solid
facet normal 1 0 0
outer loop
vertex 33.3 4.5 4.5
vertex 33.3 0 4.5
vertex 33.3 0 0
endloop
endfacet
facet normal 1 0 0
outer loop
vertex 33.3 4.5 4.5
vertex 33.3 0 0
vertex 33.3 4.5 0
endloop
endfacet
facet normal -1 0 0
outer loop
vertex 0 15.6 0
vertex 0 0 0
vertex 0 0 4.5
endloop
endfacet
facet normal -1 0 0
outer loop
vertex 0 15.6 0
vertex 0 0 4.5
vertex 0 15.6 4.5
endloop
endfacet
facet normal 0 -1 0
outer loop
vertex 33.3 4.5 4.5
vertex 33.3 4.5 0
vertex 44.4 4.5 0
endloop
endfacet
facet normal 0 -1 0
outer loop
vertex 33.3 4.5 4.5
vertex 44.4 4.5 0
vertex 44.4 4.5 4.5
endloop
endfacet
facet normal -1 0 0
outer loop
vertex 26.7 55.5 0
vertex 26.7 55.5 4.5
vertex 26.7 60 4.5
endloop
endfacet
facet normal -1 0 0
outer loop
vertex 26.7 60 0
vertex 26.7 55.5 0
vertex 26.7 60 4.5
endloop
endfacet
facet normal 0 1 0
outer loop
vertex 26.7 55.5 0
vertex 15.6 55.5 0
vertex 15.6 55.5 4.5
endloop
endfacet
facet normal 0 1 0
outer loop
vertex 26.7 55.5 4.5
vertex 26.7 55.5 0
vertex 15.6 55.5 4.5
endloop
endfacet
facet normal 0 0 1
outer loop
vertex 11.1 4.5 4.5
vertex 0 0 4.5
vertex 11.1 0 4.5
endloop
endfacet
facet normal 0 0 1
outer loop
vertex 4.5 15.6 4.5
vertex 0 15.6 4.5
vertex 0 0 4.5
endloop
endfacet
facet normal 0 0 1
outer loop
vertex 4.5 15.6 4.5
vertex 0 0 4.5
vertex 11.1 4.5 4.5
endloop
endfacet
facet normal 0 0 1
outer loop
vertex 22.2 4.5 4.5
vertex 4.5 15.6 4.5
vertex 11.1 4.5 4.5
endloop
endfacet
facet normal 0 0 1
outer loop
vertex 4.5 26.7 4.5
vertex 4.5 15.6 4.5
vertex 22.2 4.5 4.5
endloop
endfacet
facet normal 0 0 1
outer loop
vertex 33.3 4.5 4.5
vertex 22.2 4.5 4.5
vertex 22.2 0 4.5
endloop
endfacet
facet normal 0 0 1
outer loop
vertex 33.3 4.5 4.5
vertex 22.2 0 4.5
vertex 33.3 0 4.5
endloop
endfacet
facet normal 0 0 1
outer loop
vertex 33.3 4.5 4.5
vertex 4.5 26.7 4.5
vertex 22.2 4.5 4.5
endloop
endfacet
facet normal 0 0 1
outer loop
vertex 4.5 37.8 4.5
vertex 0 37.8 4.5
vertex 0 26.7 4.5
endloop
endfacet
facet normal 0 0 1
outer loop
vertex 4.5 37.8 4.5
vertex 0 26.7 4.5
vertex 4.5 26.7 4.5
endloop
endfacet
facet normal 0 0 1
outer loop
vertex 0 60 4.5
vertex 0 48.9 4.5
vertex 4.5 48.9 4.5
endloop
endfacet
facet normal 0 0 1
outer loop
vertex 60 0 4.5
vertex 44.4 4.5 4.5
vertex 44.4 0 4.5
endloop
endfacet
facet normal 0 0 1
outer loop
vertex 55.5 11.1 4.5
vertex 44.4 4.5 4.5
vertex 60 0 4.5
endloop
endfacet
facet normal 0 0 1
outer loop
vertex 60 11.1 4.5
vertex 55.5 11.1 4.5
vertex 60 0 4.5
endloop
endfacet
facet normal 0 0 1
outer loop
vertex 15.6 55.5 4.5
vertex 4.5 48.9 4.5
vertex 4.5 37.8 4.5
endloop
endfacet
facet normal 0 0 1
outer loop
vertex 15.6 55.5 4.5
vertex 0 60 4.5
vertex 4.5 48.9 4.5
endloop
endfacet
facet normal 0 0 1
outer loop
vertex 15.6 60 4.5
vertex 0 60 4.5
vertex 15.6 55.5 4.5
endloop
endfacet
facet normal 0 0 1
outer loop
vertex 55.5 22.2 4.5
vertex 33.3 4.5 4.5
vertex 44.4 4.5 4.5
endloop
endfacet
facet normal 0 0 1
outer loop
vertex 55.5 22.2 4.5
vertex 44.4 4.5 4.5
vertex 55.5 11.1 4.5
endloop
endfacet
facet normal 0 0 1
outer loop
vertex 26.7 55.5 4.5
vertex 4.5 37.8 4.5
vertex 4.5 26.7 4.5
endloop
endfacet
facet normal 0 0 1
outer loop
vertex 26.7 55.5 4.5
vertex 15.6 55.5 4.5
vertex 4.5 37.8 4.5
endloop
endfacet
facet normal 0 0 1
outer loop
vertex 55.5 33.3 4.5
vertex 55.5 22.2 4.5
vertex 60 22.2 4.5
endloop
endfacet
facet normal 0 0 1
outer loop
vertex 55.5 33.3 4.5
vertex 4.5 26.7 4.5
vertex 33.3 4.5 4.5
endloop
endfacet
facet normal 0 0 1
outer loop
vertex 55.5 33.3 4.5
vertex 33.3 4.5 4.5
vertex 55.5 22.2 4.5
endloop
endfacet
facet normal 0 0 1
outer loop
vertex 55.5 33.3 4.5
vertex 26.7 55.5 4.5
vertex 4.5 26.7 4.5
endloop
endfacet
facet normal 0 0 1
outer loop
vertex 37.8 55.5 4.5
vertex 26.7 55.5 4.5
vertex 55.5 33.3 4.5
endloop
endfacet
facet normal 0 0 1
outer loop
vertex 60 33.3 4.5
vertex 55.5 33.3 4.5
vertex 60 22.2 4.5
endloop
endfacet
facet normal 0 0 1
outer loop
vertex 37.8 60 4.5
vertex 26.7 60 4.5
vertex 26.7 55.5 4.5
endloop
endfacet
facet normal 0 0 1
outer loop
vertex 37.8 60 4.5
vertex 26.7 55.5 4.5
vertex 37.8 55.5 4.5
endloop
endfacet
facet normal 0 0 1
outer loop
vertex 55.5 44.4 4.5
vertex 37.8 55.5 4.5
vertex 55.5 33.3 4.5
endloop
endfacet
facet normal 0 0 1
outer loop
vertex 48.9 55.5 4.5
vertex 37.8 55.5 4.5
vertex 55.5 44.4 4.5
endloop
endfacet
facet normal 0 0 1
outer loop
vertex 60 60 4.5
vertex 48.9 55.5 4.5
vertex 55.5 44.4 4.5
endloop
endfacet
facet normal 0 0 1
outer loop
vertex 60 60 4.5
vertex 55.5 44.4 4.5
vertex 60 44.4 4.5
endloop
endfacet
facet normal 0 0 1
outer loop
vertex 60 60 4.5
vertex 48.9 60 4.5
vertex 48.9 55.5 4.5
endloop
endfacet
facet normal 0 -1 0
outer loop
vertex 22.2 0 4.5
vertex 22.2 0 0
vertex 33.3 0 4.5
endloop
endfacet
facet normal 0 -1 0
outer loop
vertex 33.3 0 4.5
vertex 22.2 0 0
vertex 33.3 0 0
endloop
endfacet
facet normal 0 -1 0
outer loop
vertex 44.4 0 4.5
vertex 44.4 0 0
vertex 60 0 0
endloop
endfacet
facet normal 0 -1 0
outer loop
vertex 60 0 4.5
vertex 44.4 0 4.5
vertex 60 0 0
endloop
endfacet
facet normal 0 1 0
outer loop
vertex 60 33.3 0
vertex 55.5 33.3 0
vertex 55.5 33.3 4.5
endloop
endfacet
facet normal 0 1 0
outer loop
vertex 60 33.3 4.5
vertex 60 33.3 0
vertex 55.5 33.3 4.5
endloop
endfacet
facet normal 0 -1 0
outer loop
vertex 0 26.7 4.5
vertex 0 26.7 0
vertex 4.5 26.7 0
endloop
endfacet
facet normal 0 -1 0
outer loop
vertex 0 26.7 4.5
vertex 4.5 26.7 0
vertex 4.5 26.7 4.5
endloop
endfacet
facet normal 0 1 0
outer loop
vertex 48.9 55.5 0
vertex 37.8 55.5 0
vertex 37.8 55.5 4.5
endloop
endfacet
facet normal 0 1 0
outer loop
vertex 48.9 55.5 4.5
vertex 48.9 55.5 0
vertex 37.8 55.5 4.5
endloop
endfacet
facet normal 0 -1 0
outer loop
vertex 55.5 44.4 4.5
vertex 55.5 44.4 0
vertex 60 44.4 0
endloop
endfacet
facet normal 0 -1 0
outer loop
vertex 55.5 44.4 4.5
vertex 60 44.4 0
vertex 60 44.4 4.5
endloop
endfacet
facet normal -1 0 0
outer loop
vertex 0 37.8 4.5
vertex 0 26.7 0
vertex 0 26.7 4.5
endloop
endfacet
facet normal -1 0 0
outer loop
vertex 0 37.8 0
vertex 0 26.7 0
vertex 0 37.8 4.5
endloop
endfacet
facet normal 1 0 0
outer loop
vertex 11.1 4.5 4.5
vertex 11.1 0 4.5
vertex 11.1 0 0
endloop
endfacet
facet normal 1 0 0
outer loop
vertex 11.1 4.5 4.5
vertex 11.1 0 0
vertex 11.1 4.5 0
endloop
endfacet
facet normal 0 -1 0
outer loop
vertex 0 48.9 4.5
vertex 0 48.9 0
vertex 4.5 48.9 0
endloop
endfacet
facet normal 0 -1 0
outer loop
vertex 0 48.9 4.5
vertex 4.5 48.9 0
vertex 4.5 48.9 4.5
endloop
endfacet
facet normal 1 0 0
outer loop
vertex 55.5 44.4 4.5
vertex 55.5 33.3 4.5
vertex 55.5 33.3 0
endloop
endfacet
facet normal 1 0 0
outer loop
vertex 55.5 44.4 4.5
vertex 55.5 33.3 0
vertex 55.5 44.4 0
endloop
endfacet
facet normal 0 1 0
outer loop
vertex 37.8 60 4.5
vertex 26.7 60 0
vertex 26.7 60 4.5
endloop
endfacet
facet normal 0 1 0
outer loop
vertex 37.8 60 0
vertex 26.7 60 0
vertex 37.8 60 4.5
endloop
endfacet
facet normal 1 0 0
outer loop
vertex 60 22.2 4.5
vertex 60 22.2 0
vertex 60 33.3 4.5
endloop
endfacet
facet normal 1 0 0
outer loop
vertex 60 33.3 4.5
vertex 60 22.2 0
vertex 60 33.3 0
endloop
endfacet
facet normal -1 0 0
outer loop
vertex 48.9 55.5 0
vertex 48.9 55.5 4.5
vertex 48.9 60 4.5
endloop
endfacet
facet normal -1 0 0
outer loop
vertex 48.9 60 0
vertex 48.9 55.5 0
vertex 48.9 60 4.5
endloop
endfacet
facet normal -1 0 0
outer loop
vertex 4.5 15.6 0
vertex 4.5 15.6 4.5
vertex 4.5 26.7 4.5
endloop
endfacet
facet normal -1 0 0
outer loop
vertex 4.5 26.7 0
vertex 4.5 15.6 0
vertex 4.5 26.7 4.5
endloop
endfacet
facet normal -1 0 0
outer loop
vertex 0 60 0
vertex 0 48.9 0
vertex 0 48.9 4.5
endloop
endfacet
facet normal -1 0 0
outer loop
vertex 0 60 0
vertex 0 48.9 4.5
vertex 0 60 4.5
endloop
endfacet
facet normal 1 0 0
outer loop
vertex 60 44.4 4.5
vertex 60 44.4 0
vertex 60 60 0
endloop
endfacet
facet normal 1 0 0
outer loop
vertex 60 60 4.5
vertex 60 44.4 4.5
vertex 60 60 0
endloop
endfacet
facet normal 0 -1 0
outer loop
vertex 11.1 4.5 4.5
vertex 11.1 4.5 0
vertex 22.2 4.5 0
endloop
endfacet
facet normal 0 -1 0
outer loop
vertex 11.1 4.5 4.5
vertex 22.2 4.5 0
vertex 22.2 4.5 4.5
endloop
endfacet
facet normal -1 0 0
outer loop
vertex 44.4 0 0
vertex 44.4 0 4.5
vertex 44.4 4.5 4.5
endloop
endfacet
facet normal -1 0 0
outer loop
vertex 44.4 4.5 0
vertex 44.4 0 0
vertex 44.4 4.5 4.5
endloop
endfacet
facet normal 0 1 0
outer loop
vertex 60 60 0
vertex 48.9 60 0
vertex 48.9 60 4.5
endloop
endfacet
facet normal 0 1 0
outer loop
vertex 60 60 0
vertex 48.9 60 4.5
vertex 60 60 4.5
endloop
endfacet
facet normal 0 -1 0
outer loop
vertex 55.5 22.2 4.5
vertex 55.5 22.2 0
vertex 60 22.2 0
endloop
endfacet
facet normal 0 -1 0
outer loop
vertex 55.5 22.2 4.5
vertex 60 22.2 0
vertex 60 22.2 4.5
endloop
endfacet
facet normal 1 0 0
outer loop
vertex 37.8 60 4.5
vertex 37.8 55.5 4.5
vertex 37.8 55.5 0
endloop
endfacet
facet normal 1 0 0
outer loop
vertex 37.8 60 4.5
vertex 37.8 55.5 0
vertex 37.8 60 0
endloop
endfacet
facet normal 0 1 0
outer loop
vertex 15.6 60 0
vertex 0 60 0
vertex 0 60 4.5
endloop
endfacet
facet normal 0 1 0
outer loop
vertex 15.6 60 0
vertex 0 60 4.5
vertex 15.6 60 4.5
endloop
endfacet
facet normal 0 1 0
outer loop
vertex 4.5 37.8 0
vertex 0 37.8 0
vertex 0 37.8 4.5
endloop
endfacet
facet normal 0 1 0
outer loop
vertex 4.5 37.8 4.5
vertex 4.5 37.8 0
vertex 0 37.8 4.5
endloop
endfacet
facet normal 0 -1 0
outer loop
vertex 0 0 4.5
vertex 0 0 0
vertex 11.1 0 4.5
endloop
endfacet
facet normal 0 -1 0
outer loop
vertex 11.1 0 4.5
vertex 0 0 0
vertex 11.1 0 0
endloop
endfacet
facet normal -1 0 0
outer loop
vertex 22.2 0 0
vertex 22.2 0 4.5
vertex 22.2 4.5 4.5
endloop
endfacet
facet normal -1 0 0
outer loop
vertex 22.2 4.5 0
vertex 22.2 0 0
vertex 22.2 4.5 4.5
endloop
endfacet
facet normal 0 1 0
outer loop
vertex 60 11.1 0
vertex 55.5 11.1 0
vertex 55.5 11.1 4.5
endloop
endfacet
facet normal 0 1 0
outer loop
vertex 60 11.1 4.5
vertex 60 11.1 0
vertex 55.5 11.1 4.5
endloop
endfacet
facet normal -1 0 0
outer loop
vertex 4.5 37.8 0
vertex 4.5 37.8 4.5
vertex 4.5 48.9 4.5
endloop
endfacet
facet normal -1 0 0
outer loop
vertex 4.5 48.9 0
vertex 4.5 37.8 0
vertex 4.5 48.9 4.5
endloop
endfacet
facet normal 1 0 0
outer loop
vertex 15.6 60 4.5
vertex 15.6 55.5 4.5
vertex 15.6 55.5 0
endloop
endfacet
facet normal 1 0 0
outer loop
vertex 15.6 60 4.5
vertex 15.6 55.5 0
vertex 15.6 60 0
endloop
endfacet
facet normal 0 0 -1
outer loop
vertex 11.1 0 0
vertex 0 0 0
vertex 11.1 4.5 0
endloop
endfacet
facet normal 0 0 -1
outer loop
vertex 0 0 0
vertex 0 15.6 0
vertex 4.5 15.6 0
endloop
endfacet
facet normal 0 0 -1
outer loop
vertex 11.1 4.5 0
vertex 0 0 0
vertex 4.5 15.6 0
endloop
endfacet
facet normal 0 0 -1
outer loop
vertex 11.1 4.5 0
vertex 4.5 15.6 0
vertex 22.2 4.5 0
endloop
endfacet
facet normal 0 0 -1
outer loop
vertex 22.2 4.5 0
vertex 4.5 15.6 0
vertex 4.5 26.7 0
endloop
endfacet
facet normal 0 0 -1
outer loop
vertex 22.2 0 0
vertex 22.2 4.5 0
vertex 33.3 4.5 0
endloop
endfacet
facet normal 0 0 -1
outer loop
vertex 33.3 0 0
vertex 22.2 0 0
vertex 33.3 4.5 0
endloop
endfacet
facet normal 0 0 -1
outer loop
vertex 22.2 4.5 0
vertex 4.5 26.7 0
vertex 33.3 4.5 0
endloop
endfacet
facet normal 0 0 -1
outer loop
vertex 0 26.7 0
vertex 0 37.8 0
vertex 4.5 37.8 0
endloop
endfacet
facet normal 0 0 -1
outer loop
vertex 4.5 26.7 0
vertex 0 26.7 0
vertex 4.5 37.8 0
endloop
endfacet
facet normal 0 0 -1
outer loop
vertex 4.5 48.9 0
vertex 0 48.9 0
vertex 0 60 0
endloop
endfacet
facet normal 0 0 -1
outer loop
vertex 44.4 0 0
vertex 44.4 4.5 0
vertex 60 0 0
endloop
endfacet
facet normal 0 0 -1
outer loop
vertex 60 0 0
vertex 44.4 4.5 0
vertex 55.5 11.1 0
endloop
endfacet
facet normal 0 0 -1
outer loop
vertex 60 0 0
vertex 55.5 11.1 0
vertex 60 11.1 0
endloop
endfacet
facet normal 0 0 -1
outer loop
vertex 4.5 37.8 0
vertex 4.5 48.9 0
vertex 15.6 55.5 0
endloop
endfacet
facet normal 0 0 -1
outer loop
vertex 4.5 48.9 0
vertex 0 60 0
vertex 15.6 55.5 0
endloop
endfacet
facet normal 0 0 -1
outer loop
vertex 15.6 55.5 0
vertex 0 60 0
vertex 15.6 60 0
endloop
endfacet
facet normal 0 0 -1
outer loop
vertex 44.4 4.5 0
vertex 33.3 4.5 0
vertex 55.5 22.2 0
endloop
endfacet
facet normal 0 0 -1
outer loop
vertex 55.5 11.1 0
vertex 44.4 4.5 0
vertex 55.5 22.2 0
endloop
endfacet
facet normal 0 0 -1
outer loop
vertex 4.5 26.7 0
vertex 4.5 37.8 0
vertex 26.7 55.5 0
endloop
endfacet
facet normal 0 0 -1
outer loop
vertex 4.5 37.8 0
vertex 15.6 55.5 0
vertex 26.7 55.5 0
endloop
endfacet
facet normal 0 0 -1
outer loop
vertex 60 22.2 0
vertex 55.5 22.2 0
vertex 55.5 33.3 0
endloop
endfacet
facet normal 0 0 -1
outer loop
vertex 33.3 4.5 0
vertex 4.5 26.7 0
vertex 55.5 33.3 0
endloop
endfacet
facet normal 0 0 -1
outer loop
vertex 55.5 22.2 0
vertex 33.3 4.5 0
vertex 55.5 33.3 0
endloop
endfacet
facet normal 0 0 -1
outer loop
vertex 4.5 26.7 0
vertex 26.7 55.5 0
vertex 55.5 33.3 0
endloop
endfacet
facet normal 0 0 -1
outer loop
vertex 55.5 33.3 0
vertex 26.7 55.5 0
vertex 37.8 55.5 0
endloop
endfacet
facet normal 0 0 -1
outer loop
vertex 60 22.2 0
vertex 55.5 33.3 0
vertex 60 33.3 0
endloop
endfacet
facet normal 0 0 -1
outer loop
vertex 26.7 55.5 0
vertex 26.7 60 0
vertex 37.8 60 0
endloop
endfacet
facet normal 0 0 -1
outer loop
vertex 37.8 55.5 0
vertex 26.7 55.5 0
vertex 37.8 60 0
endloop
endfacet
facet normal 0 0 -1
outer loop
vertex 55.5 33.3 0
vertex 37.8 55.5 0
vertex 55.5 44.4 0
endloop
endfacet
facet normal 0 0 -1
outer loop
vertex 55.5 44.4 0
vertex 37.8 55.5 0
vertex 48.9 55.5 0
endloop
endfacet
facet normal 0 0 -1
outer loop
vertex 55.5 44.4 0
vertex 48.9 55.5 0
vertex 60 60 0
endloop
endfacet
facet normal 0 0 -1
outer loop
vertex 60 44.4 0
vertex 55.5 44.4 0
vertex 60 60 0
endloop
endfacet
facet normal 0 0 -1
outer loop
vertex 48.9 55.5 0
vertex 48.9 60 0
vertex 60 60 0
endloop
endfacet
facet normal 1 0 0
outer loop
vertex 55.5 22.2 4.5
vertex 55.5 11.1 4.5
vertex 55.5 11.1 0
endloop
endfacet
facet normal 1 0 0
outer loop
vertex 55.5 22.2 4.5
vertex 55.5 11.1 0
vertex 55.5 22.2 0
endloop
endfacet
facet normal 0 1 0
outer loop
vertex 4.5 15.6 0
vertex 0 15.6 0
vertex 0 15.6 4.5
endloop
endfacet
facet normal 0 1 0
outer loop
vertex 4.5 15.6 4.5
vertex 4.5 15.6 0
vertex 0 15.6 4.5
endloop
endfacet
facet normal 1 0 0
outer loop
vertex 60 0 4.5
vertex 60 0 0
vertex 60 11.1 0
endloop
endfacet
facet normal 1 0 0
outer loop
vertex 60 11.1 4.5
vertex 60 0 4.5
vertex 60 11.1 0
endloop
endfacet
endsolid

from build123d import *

# Parameters (mm, degrees)
SKETCH1_W           = 60
SKETCH1_H           = 60
BOSS_EXTRUDE1_DEPTH = 4.5
CAVITY1_OUTLINE_W   = 11.1
CAVITY1_OUTLINE_H   = 4.5
CAVITY1_DEPTH       = 4.5
CAVITY1_START       = 55.5
CAVITY1_2_OUTLINE_W = 11.1
CAVITY1_2_OUTLINE_H = 4.5
CAVITY1_2_DEPTH     = 4.5
CAVITY1_START_2     = 15.6
CAVITY1_3_OUTLINE_W = 4.5
CAVITY1_3_OUTLINE_H = 4.5
CAVITY1_3_DEPTH     = 6.6
CAVITY1_START_3     = 37.8
CAVITY1_4_OUTLINE_W = 4.5
CAVITY1_4_OUTLINE_H = 4.5
CAVITY1_4_DEPTH     = 6.6
CAVITY1_START_4     = 11.1
CAVITY1_5_OUTLINE_W = 4.5
CAVITY1_5_OUTLINE_H = 4.5
CAVITY1_5_DEPTH     = 4.5
CAVITY1_START_5     = 22.2
CAVITY1_6_OUTLINE_W = 4.5
CAVITY1_6_OUTLINE_H = 4.5
CAVITY1_6_DEPTH     = 4.5
CAVITY1_START_6     = 33.3
CAVITY1_7_OUTLINE_W = 4.5
CAVITY1_7_OUTLINE_H = 4.5
CAVITY1_7_DEPTH     = 4.5
CAVITY1_START_7     = 44.4
CAVITY1_8_OUTLINE_W = 4.5
CAVITY1_8_OUTLINE_H = 4.5
CAVITY1_8_DEPTH     = 4.5


# Read off the part's stored shape, not the designer's step: Cavity1
with BuildPart() as part:
    # Sketch1 → Boss-Extrude1 (new body)
    with BuildSketch(Plane.XY):
        with Locations((30, 30)):
            Rectangle(SKETCH1_W, SKETCH1_H)
    extrude(amount=BOSS_EXTRUDE1_DEPTH)

    # Cavity1 outline → Cavity1 (cut)
    with BuildSketch(Plane.YZ):
        with Locations((21.15, 2.25)):
            Rectangle(CAVITY1_OUTLINE_W, CAVITY1_OUTLINE_H)
        with Locations((43.35, 2.25)):
            Rectangle(CAVITY1_OUTLINE_W, CAVITY1_OUTLINE_H)
    extrude(amount=CAVITY1_DEPTH, mode=Mode.SUBTRACT)

    # Cavity1 2 outline → Cavity1 2 (cut)
    with BuildSketch(Plane.YZ.offset(CAVITY1_START)):
        with Locations((16.65, 2.25)):
            Rectangle(CAVITY1_2_OUTLINE_W, CAVITY1_2_OUTLINE_H)
        with Locations((38.85, 2.25)):
            Rectangle(CAVITY1_2_OUTLINE_W, CAVITY1_2_OUTLINE_H)
    extrude(amount=CAVITY1_2_DEPTH, mode=Mode.SUBTRACT)

    # Cavity1 3 outline → Cavity1 3 (cut)
    with BuildSketch(Plane.YZ.offset(CAVITY1_START_2)):
        with Locations((2.25, 2.25)):
            Rectangle(CAVITY1_3_OUTLINE_W, CAVITY1_3_OUTLINE_H)
        with Locations((57.75, 2.25)):
            Rectangle(CAVITY1_3_OUTLINE_W, CAVITY1_3_OUTLINE_H)
    extrude(amount=CAVITY1_3_DEPTH, mode=Mode.SUBTRACT)

    # Cavity1 4 outline → Cavity1 4 (cut)
    with BuildSketch(Plane.YZ.offset(CAVITY1_START_3)):
        with Locations((2.25, 2.25)):
            Rectangle(CAVITY1_4_OUTLINE_W, CAVITY1_4_OUTLINE_H)
        with Locations((57.75, 2.25)):
            Rectangle(CAVITY1_4_OUTLINE_W, CAVITY1_4_OUTLINE_H)
    extrude(amount=CAVITY1_4_DEPTH, mode=Mode.SUBTRACT)

    # Cavity1 5 outline → Cavity1 5 (cut)
    with BuildSketch(Plane.YZ.offset(CAVITY1_START_4)):
        with Locations((2.25, 2.25)):
            Rectangle(CAVITY1_5_OUTLINE_W, CAVITY1_5_OUTLINE_H)
    extrude(amount=CAVITY1_5_DEPTH, mode=Mode.SUBTRACT)

    # Cavity1 6 outline → Cavity1 6 (cut)
    with BuildSketch(Plane.YZ.offset(CAVITY1_START_5)):
        with Locations((57.75, 2.25)):
            Rectangle(CAVITY1_6_OUTLINE_W, CAVITY1_6_OUTLINE_H)
    extrude(amount=CAVITY1_6_DEPTH, mode=Mode.SUBTRACT)

    # Cavity1 7 outline → Cavity1 7 (cut)
    with BuildSketch(Plane.YZ.offset(CAVITY1_START_6)):
        with Locations((2.25, 2.25)):
            Rectangle(CAVITY1_7_OUTLINE_W, CAVITY1_7_OUTLINE_H)
    extrude(amount=CAVITY1_7_DEPTH, mode=Mode.SUBTRACT)

    # Cavity1 8 outline → Cavity1 8 (cut)
    with BuildSketch(Plane.YZ.offset(CAVITY1_START_7)):
        with Locations((57.75, 2.25)):
            Rectangle(CAVITY1_8_OUTLINE_W, CAVITY1_8_OUTLINE_H)
    extrude(amount=CAVITY1_8_DEPTH, mode=Mode.SUBTRACT)


solid = part.part
